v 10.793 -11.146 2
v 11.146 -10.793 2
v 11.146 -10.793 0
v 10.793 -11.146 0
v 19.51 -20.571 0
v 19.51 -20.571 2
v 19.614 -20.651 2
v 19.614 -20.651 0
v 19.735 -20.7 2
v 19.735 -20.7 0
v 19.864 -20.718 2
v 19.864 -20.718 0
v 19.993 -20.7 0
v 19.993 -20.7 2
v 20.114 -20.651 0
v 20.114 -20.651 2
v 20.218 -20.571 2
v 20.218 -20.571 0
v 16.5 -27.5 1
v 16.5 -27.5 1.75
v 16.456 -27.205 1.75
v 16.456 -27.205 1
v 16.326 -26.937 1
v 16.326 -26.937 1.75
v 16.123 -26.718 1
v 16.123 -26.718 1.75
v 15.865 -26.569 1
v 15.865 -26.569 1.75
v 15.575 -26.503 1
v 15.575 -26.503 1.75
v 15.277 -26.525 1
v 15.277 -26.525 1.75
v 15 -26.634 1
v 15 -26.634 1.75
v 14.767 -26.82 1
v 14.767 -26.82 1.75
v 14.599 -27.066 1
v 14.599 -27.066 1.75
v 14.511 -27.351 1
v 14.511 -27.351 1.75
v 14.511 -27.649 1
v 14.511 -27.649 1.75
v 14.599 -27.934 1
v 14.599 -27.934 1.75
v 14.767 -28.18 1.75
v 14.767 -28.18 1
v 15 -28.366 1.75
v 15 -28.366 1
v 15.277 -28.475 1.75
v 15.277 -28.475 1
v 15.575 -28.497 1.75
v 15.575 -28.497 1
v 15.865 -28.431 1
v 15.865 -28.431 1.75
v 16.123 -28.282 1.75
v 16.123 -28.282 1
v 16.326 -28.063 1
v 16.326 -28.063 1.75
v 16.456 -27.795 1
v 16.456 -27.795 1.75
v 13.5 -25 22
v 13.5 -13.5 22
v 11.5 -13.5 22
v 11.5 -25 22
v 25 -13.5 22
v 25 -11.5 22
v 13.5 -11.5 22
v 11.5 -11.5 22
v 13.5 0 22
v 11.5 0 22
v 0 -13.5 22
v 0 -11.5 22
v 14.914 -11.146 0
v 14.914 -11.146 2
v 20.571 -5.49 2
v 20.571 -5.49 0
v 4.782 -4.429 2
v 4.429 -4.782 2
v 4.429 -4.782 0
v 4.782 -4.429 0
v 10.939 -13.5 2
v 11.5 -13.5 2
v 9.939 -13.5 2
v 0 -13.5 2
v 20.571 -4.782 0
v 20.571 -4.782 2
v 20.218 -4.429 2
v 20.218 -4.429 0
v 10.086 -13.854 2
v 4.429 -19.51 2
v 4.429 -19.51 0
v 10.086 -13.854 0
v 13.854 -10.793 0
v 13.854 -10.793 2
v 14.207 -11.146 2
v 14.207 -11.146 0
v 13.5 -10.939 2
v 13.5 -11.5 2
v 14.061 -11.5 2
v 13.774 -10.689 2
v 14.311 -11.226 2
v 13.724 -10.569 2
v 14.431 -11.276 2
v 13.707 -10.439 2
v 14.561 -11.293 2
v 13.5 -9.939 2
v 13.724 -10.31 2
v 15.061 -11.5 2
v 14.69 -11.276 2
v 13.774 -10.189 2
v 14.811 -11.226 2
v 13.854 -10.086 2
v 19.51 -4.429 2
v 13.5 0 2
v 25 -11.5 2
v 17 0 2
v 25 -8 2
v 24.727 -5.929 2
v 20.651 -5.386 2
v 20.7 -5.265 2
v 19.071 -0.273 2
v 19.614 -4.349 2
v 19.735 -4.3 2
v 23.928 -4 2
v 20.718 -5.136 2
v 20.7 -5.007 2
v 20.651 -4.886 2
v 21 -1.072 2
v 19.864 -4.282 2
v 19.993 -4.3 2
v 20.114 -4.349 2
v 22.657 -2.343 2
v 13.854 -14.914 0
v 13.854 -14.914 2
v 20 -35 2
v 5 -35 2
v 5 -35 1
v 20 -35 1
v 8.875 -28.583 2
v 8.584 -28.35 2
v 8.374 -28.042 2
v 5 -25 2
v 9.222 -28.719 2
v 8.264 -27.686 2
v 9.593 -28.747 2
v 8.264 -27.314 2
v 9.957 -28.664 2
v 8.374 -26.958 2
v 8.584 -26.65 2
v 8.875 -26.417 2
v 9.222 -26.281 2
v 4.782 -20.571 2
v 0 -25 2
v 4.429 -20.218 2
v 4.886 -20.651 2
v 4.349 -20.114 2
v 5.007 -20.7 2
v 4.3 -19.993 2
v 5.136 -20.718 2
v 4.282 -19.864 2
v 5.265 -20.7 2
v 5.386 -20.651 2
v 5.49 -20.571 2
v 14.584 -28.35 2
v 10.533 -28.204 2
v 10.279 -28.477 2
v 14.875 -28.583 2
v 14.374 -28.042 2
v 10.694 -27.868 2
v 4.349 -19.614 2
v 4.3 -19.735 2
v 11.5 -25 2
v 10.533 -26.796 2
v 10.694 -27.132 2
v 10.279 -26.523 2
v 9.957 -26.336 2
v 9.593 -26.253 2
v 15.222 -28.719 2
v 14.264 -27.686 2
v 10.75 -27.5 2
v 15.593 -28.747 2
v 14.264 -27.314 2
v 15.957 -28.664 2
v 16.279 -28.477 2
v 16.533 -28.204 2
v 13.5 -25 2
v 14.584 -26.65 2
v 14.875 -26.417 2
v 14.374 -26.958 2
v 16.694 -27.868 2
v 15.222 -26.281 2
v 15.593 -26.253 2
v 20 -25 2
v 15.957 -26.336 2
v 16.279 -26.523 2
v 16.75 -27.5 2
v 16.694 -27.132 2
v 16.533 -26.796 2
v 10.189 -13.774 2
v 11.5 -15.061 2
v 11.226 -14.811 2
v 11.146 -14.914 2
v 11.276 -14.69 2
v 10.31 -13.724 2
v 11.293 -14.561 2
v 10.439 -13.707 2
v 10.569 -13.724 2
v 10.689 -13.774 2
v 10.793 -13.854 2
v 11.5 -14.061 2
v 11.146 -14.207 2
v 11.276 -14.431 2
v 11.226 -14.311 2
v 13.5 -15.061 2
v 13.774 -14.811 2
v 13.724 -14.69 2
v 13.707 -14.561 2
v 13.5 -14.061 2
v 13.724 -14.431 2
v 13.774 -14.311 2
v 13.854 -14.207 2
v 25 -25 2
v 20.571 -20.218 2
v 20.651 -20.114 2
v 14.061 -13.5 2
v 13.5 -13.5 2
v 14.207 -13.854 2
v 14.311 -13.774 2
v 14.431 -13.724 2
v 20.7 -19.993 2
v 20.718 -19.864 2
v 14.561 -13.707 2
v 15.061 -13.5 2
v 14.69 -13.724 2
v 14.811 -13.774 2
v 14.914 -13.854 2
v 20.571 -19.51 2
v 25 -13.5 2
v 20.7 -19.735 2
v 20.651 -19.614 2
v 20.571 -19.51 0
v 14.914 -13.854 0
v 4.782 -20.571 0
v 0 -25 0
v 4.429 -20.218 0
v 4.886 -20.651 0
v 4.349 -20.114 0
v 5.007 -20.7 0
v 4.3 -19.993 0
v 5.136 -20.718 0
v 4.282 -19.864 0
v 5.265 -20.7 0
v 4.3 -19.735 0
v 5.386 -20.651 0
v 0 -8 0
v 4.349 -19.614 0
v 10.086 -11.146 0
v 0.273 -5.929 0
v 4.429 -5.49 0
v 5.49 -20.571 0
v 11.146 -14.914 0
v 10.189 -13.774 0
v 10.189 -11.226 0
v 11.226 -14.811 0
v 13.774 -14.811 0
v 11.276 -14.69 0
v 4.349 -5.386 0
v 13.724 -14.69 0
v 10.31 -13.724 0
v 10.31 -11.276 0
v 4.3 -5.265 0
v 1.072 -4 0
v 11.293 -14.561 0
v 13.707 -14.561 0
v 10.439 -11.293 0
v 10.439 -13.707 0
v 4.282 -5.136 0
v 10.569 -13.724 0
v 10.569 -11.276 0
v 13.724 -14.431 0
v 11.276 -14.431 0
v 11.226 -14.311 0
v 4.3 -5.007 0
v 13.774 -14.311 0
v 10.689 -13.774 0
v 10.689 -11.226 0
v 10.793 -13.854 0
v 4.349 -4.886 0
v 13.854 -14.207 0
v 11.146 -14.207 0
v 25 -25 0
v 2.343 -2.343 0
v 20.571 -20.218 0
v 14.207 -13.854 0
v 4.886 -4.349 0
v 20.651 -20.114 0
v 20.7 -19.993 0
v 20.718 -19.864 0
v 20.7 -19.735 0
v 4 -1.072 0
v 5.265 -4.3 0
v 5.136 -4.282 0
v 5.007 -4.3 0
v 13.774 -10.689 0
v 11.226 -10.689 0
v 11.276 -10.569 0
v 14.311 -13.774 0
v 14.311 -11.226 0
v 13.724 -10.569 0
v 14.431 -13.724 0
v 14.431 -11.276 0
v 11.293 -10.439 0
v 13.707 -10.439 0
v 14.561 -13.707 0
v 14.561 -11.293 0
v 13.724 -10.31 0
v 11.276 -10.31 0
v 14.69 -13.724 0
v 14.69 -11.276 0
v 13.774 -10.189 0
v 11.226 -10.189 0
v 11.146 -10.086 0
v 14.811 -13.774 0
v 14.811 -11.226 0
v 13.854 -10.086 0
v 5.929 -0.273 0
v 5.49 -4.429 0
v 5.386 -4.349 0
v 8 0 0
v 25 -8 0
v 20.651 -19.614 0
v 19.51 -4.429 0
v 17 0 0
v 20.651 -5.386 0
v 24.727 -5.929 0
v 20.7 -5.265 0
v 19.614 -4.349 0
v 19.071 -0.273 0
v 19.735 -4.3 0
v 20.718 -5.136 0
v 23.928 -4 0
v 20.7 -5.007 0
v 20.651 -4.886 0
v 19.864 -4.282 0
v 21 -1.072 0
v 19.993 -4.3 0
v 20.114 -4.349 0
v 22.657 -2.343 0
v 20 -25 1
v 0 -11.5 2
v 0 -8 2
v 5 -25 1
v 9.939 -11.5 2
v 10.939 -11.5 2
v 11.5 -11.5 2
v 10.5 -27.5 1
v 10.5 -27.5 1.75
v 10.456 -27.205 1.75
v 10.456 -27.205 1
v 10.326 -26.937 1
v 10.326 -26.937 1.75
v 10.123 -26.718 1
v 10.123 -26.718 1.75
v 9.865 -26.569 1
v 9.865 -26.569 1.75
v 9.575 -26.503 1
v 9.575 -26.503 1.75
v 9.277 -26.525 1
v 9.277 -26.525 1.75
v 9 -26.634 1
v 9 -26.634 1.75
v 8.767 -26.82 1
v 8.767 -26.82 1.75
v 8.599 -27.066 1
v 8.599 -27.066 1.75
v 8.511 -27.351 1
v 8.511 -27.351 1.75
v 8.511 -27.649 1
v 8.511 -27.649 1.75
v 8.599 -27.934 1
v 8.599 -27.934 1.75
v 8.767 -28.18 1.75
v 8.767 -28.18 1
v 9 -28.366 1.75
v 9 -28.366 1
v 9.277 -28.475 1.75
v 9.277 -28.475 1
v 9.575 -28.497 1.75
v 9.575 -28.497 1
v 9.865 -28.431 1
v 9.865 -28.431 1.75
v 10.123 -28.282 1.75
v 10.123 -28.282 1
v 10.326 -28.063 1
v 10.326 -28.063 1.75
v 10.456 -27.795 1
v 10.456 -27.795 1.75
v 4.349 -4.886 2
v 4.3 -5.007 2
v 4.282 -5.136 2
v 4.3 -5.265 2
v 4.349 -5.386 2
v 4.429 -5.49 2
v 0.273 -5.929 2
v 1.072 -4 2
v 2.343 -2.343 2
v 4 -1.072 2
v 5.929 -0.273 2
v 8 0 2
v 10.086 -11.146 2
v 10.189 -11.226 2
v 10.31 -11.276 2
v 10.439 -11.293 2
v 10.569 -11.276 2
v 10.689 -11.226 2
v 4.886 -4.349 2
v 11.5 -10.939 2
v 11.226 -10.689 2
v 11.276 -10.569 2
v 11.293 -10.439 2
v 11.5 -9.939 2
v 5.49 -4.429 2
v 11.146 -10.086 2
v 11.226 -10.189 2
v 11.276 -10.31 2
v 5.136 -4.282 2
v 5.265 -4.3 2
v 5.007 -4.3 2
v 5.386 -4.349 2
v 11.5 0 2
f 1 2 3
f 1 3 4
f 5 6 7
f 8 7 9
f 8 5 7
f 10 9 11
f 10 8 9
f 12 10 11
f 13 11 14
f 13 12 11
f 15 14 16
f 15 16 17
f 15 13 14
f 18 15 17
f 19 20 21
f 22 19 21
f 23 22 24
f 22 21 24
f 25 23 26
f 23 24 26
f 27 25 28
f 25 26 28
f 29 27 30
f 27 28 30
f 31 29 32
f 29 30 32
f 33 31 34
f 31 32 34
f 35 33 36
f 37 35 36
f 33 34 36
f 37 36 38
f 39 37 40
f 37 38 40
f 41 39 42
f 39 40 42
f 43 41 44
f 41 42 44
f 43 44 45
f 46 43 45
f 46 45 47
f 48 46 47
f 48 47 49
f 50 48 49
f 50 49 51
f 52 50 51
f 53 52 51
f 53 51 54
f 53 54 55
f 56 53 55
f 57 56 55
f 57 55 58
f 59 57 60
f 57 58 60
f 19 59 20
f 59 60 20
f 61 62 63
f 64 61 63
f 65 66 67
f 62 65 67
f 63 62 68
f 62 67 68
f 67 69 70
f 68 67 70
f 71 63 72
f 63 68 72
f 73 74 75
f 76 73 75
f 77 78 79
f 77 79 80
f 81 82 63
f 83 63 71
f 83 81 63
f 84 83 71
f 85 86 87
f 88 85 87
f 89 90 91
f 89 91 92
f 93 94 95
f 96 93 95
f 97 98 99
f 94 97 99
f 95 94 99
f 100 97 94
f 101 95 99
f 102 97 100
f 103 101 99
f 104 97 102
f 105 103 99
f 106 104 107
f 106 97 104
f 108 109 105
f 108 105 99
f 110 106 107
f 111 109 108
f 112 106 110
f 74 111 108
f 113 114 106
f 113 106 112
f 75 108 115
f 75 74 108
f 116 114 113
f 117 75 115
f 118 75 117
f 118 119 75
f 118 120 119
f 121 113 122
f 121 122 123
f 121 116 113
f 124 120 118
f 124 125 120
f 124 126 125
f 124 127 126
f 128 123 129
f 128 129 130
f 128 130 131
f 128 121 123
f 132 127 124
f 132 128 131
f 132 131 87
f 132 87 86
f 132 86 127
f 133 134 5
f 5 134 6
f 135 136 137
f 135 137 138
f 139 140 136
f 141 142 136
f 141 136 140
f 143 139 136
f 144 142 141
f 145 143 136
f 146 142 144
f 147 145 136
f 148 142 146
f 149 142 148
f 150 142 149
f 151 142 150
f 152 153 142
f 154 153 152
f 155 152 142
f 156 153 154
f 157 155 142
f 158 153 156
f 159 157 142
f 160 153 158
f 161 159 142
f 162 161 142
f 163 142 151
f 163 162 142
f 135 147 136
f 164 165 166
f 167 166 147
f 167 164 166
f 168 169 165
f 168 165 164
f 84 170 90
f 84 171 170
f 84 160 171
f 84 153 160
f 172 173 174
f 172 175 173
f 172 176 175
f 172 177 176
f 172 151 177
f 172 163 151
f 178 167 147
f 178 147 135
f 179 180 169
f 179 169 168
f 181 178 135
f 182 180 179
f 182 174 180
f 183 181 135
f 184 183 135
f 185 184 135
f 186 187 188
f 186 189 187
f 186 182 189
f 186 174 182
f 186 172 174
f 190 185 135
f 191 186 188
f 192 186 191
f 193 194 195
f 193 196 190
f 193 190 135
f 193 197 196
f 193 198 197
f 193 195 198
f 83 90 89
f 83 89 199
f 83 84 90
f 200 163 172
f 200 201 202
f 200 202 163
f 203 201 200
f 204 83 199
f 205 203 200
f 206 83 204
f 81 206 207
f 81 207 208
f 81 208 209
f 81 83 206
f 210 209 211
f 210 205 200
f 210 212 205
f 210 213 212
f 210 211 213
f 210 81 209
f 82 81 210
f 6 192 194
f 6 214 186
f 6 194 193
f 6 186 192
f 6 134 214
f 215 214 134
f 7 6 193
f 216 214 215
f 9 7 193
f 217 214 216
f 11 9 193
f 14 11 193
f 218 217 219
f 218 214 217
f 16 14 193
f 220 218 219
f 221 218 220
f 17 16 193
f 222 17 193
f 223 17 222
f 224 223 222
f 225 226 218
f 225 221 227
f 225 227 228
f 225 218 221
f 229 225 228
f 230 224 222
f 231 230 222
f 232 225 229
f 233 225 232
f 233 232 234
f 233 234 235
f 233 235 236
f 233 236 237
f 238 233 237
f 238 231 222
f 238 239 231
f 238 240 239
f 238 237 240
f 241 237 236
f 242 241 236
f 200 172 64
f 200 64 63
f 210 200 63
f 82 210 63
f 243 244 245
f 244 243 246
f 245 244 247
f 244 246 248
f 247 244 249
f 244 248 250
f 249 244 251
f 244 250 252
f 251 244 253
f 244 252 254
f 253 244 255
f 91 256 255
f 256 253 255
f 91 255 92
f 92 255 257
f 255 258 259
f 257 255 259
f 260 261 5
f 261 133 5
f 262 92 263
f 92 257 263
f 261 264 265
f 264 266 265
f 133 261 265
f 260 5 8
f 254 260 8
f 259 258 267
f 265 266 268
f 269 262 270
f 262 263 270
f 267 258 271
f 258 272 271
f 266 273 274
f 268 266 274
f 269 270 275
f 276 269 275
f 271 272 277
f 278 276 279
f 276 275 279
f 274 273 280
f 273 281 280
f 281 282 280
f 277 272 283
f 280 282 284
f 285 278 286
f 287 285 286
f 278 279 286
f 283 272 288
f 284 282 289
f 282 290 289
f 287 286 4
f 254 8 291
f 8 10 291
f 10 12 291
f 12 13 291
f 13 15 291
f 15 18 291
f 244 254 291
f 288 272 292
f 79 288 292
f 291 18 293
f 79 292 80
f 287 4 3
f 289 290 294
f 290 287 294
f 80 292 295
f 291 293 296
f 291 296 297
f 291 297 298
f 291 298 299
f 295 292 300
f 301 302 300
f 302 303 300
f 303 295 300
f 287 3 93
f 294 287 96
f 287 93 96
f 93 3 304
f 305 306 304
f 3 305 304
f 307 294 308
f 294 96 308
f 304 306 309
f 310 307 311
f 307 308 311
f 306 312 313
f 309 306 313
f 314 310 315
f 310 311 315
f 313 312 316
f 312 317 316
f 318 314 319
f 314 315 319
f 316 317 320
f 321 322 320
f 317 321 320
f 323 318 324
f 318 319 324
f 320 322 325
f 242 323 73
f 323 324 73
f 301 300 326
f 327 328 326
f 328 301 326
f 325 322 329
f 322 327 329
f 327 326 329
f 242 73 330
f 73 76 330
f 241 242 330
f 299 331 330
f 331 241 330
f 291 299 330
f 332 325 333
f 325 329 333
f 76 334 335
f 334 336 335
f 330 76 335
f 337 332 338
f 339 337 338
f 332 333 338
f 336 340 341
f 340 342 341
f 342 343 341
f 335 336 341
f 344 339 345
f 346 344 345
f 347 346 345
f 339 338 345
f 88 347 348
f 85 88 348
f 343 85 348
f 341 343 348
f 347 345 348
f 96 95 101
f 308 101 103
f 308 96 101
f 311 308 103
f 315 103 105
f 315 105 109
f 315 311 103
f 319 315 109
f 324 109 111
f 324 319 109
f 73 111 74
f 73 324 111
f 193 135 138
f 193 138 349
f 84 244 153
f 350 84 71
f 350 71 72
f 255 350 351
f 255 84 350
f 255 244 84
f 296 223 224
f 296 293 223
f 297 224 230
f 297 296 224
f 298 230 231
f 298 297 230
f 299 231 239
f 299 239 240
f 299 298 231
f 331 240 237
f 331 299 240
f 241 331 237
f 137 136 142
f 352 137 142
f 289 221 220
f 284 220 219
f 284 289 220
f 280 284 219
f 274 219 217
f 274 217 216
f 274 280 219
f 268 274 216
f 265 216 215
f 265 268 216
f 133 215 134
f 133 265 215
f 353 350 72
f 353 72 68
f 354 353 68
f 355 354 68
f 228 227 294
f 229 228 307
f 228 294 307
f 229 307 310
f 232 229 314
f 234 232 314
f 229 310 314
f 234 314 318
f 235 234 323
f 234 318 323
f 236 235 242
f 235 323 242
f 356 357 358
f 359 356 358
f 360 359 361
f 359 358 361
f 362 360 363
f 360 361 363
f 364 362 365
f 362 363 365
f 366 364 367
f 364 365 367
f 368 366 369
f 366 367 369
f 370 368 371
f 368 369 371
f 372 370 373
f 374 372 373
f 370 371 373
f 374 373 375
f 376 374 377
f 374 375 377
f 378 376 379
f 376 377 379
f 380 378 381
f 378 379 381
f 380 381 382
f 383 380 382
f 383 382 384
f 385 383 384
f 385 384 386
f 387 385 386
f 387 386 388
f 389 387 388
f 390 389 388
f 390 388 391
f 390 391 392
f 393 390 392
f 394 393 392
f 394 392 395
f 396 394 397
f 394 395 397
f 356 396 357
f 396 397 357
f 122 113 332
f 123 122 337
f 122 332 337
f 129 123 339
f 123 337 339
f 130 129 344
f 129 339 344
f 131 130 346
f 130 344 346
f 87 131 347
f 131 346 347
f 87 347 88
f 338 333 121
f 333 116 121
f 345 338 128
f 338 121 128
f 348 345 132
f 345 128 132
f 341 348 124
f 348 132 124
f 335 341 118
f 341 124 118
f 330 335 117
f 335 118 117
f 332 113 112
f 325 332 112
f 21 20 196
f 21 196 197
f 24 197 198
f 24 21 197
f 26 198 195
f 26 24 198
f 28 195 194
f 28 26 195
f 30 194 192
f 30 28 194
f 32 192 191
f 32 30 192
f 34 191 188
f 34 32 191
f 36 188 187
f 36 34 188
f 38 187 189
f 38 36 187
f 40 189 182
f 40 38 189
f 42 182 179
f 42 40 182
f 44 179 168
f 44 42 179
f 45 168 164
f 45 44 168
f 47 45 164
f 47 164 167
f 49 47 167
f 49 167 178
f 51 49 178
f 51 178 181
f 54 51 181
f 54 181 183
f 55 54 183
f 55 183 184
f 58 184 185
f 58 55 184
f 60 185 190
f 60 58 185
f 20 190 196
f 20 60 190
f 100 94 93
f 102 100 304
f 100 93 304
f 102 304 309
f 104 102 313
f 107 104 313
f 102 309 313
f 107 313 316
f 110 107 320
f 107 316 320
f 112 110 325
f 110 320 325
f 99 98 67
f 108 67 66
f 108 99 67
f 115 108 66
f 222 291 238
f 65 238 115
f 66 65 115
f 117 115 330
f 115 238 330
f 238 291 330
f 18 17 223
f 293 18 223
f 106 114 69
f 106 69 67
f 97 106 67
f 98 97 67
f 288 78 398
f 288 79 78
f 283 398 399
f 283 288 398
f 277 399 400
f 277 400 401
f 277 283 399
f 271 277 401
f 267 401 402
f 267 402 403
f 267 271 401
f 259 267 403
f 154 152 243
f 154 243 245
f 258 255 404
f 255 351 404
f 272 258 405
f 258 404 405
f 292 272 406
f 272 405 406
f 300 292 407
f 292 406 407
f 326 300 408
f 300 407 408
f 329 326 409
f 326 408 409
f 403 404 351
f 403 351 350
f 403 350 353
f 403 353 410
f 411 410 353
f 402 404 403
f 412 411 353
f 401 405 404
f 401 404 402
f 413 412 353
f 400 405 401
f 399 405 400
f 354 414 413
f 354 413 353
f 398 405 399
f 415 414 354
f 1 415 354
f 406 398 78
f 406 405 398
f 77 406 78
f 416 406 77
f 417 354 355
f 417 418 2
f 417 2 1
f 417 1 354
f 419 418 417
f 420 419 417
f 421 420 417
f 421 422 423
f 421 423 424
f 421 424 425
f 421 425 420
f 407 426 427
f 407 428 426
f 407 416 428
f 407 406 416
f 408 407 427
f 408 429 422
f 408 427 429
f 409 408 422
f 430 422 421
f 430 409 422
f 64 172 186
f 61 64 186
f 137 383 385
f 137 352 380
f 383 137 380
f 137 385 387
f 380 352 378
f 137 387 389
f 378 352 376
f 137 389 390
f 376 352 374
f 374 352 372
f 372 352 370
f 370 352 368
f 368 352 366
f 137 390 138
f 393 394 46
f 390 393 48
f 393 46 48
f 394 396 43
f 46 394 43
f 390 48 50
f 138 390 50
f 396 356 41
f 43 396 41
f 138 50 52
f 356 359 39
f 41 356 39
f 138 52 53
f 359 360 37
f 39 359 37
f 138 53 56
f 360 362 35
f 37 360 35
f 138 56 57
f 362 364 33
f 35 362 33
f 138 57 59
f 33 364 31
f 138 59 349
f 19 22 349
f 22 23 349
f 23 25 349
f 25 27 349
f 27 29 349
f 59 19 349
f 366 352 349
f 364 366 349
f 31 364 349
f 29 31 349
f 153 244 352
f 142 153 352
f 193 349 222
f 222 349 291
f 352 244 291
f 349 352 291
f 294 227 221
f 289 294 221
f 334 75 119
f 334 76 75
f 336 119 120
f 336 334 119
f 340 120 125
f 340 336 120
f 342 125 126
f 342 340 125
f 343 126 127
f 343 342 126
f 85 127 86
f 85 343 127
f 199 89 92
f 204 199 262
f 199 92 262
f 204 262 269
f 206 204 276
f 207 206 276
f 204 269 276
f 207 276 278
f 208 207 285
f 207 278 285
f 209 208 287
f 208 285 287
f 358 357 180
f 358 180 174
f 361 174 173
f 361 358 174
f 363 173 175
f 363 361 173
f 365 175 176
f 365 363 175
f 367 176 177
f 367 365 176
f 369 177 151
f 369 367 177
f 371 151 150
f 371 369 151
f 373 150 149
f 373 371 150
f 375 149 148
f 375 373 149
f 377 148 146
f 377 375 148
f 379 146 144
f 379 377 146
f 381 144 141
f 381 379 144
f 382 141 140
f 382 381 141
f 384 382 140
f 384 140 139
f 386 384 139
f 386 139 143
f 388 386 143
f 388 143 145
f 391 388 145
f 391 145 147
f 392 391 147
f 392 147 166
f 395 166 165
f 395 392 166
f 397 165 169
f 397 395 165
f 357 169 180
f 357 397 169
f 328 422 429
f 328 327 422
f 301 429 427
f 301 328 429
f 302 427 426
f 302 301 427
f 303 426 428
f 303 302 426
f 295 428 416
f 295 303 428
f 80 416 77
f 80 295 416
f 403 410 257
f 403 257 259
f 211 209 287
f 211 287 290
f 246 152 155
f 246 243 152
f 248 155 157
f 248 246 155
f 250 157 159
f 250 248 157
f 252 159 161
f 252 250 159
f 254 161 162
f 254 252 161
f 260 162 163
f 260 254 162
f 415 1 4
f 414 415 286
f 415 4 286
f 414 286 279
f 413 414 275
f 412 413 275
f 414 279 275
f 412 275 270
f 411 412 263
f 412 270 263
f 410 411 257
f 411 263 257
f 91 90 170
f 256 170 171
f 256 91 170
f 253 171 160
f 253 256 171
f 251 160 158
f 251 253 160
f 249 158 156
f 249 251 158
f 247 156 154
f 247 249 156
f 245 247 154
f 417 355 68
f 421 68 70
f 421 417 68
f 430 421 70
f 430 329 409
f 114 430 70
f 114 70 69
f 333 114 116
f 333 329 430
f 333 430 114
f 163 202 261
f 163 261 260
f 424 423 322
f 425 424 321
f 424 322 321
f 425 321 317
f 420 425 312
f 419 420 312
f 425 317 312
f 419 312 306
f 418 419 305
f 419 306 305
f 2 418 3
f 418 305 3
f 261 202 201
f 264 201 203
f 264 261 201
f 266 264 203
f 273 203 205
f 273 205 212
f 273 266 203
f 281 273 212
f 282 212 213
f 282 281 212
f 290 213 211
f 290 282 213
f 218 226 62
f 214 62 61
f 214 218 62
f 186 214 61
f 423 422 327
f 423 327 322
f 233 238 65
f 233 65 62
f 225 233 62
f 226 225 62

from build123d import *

# Parameters (mm, degrees)
SZKIC2_W                    = 25
SZKIC2_H                    = 25
DODANIE_WYCI_GNI_CIE1_DEPTH = 2
DODANIE_WYCI_GNI_CIE2_DEPTH = 20
ZAOKR_GLENIE1_R             = 8
WYTNIJ_WYCI_GNI_CIE1_DEPTH  = 20
ZAOKR_GLENIE2_R             = 0.5
WYTNIJ_WYCI_GNI_CIE2_DEPTH  = 20
WYTNIJ_WYCI_GNI_CIE3_DEPTH  = 20
WYTNIJ_WYCI_GNI_CIE4_DEPTH  = 20
ZAOKR_GLENIE3_R             = 0.5
SZKIC14_W                   = 15
SZKIC14_H                   = 10
DODANIE_WYCI_GNI_CIE3_DEPTH = 1
SZKIC13_R                   = 1
WYTNIJ_WYCI_GNI_CIE5_DEPTH  = 1
SFAZOWANIE1_SIZE            = 0.25


with BuildPart() as part:
    # Szkic2 → Dodanie-wyciągnięcie1 (new body)
    with BuildSketch(Plane.XY):
        with Locations((12.5, -12.5)):
            Rectangle(SZKIC2_W, SZKIC2_H)
    extrude(amount=DODANIE_WYCI_GNI_CIE1_DEPTH)

    # Szkic3 → Dodanie-wyciągnięcie2 (add)
    with BuildSketch(Plane.XY.offset(2)):
        Polygon((11.5, 0), (13.5, 0), (13.5, -11.5), (25, -11.5), (25, -13.5), (13.5, -13.5), (13.5, -25), (11.5, -25), (11.5, -13.5), (0, -13.5), (0, -11.5), (11.5, -11.5), align=None)
    extrude(amount=DODANIE_WYCI_GNI_CIE2_DEPTH)

    # Zaokrąglenie1
    zaokr_glenie1_edges = [part.edges().sort_by_distance(p)[0] for p in [
        (0, 0, 1),
        (25, 0, 1),
    ]]
    fillet(zaokr_glenie1_edges, radius=ZAOKR_GLENIE1_R)

    # Szkic7 → Wytnij-wyciągnięcie1 (cut)
    with BuildSketch(Plane.XY.offset(2)):
        Polygon((10.439339828, -13.5), (11.5, -14.560660172), (5.136038969, -20.924621202), (4.075378798, -19.863961031), align=None)
    extrude(amount=-WYTNIJ_WYCI_GNI_CIE1_DEPTH, mode=Mode.SUBTRACT)

    # Zaokrąglenie2
    zaokr_glenie2_edges = [part.edges().sort_by_distance(p)[0] for p in [
        (4.075378798, -19.863961031, 1),
        (10.439339828, -13.5, 1),
        (11.5, -14.560660172, 1),
        (5.136038969, -20.924621202, 1),
    ]]
    fillet(zaokr_glenie2_edges, radius=ZAOKR_GLENIE2_R)

    # Szkic9 → Wytnij-wyciągnięcie2 (cut)
    with BuildSketch(Plane.XY.offset(2)):
        Polygon((11.5, -10.439339828), (10.439339828, -11.5), (4.075378798, -5.136038969), (5.136038969, -4.075378798), align=None)
    extrude(amount=-WYTNIJ_WYCI_GNI_CIE2_DEPTH, mode=Mode.SUBTRACT)

    # Szkic11 → Wytnij-wyciągnięcie3 (cut)
    with BuildSketch(Plane.XY.offset(2)):
        Polygon((13.5, -10.439339828), (14.560660172, -11.5), (20.924621202, -5.136038969), (19.863961031, -4.075378798), align=None)
    extrude(amount=-WYTNIJ_WYCI_GNI_CIE3_DEPTH, mode=Mode.SUBTRACT)

    # Szkic12 → Wytnij-wyciągnięcie4 (cut)
    with BuildSketch(Plane.XY.offset(2)):
        Polygon((14.560660172, -13.5), (13.5, -14.560660172), (19.863961031, -20.924621202), (20.924621202, -19.863961031), align=None)
    extrude(amount=-WYTNIJ_WYCI_GNI_CIE4_DEPTH, mode=Mode.SUBTRACT)

    # Zaokrąglenie3
    zaokr_glenie3_edges = [part.edges().sort_by_distance(p)[0] for p in [
        (5.136038969, -4.075378798, 1),
        (11.5, -10.439339828, 1),
        (10.439339828, -11.5, 1),
        (4.075378798, -5.136038969, 1),
        (13.5, -10.439339828, 1),
        (19.863961031, -4.075378798, 1),
        (20.924621202, -5.136038969, 1),
        (14.560660172, -11.5, 1),
        (14.560660172, -13.5, 1),
        (20.924621202, -19.863961031, 1),
        (19.863961031, -20.924621202, 1),
        (13.5, -14.560660172, 1),
    ]]
    fillet(zaokr_glenie3_edges, radius=ZAOKR_GLENIE3_R)

    # Szkic14 → Dodanie-wyciągnięcie3 (add)
    with BuildSketch(Plane.XY.offset(2)):
        with Locations((12.5, -30)):
            Rectangle(SZKIC14_W, SZKIC14_H)
    extrude(amount=-DODANIE_WYCI_GNI_CIE3_DEPTH)

    # Szkic13 → Wytnij-wyciągnięcie5 (cut)
    with BuildSketch(Plane.XY.offset(2)):
        with Locations((9.5, -27.5)):
            Circle(SZKIC13_R)
        with Locations((15.5, -27.5)):
            Circle(SZKIC13_R)
    extrude(amount=-WYTNIJ_WYCI_GNI_CIE5_DEPTH, mode=Mode.SUBTRACT)

    # Sfazowanie1
    sfazowanie1_edges = [part.edges().sort_by_distance(p)[0] for p in [
        (8.5, -27.5, 2),
        (14.5, -27.5, 2),
    ]]
    chamfer(sfazowanie1_edges, length=SFAZOWANIE1_SIZE)


solid = part.part
